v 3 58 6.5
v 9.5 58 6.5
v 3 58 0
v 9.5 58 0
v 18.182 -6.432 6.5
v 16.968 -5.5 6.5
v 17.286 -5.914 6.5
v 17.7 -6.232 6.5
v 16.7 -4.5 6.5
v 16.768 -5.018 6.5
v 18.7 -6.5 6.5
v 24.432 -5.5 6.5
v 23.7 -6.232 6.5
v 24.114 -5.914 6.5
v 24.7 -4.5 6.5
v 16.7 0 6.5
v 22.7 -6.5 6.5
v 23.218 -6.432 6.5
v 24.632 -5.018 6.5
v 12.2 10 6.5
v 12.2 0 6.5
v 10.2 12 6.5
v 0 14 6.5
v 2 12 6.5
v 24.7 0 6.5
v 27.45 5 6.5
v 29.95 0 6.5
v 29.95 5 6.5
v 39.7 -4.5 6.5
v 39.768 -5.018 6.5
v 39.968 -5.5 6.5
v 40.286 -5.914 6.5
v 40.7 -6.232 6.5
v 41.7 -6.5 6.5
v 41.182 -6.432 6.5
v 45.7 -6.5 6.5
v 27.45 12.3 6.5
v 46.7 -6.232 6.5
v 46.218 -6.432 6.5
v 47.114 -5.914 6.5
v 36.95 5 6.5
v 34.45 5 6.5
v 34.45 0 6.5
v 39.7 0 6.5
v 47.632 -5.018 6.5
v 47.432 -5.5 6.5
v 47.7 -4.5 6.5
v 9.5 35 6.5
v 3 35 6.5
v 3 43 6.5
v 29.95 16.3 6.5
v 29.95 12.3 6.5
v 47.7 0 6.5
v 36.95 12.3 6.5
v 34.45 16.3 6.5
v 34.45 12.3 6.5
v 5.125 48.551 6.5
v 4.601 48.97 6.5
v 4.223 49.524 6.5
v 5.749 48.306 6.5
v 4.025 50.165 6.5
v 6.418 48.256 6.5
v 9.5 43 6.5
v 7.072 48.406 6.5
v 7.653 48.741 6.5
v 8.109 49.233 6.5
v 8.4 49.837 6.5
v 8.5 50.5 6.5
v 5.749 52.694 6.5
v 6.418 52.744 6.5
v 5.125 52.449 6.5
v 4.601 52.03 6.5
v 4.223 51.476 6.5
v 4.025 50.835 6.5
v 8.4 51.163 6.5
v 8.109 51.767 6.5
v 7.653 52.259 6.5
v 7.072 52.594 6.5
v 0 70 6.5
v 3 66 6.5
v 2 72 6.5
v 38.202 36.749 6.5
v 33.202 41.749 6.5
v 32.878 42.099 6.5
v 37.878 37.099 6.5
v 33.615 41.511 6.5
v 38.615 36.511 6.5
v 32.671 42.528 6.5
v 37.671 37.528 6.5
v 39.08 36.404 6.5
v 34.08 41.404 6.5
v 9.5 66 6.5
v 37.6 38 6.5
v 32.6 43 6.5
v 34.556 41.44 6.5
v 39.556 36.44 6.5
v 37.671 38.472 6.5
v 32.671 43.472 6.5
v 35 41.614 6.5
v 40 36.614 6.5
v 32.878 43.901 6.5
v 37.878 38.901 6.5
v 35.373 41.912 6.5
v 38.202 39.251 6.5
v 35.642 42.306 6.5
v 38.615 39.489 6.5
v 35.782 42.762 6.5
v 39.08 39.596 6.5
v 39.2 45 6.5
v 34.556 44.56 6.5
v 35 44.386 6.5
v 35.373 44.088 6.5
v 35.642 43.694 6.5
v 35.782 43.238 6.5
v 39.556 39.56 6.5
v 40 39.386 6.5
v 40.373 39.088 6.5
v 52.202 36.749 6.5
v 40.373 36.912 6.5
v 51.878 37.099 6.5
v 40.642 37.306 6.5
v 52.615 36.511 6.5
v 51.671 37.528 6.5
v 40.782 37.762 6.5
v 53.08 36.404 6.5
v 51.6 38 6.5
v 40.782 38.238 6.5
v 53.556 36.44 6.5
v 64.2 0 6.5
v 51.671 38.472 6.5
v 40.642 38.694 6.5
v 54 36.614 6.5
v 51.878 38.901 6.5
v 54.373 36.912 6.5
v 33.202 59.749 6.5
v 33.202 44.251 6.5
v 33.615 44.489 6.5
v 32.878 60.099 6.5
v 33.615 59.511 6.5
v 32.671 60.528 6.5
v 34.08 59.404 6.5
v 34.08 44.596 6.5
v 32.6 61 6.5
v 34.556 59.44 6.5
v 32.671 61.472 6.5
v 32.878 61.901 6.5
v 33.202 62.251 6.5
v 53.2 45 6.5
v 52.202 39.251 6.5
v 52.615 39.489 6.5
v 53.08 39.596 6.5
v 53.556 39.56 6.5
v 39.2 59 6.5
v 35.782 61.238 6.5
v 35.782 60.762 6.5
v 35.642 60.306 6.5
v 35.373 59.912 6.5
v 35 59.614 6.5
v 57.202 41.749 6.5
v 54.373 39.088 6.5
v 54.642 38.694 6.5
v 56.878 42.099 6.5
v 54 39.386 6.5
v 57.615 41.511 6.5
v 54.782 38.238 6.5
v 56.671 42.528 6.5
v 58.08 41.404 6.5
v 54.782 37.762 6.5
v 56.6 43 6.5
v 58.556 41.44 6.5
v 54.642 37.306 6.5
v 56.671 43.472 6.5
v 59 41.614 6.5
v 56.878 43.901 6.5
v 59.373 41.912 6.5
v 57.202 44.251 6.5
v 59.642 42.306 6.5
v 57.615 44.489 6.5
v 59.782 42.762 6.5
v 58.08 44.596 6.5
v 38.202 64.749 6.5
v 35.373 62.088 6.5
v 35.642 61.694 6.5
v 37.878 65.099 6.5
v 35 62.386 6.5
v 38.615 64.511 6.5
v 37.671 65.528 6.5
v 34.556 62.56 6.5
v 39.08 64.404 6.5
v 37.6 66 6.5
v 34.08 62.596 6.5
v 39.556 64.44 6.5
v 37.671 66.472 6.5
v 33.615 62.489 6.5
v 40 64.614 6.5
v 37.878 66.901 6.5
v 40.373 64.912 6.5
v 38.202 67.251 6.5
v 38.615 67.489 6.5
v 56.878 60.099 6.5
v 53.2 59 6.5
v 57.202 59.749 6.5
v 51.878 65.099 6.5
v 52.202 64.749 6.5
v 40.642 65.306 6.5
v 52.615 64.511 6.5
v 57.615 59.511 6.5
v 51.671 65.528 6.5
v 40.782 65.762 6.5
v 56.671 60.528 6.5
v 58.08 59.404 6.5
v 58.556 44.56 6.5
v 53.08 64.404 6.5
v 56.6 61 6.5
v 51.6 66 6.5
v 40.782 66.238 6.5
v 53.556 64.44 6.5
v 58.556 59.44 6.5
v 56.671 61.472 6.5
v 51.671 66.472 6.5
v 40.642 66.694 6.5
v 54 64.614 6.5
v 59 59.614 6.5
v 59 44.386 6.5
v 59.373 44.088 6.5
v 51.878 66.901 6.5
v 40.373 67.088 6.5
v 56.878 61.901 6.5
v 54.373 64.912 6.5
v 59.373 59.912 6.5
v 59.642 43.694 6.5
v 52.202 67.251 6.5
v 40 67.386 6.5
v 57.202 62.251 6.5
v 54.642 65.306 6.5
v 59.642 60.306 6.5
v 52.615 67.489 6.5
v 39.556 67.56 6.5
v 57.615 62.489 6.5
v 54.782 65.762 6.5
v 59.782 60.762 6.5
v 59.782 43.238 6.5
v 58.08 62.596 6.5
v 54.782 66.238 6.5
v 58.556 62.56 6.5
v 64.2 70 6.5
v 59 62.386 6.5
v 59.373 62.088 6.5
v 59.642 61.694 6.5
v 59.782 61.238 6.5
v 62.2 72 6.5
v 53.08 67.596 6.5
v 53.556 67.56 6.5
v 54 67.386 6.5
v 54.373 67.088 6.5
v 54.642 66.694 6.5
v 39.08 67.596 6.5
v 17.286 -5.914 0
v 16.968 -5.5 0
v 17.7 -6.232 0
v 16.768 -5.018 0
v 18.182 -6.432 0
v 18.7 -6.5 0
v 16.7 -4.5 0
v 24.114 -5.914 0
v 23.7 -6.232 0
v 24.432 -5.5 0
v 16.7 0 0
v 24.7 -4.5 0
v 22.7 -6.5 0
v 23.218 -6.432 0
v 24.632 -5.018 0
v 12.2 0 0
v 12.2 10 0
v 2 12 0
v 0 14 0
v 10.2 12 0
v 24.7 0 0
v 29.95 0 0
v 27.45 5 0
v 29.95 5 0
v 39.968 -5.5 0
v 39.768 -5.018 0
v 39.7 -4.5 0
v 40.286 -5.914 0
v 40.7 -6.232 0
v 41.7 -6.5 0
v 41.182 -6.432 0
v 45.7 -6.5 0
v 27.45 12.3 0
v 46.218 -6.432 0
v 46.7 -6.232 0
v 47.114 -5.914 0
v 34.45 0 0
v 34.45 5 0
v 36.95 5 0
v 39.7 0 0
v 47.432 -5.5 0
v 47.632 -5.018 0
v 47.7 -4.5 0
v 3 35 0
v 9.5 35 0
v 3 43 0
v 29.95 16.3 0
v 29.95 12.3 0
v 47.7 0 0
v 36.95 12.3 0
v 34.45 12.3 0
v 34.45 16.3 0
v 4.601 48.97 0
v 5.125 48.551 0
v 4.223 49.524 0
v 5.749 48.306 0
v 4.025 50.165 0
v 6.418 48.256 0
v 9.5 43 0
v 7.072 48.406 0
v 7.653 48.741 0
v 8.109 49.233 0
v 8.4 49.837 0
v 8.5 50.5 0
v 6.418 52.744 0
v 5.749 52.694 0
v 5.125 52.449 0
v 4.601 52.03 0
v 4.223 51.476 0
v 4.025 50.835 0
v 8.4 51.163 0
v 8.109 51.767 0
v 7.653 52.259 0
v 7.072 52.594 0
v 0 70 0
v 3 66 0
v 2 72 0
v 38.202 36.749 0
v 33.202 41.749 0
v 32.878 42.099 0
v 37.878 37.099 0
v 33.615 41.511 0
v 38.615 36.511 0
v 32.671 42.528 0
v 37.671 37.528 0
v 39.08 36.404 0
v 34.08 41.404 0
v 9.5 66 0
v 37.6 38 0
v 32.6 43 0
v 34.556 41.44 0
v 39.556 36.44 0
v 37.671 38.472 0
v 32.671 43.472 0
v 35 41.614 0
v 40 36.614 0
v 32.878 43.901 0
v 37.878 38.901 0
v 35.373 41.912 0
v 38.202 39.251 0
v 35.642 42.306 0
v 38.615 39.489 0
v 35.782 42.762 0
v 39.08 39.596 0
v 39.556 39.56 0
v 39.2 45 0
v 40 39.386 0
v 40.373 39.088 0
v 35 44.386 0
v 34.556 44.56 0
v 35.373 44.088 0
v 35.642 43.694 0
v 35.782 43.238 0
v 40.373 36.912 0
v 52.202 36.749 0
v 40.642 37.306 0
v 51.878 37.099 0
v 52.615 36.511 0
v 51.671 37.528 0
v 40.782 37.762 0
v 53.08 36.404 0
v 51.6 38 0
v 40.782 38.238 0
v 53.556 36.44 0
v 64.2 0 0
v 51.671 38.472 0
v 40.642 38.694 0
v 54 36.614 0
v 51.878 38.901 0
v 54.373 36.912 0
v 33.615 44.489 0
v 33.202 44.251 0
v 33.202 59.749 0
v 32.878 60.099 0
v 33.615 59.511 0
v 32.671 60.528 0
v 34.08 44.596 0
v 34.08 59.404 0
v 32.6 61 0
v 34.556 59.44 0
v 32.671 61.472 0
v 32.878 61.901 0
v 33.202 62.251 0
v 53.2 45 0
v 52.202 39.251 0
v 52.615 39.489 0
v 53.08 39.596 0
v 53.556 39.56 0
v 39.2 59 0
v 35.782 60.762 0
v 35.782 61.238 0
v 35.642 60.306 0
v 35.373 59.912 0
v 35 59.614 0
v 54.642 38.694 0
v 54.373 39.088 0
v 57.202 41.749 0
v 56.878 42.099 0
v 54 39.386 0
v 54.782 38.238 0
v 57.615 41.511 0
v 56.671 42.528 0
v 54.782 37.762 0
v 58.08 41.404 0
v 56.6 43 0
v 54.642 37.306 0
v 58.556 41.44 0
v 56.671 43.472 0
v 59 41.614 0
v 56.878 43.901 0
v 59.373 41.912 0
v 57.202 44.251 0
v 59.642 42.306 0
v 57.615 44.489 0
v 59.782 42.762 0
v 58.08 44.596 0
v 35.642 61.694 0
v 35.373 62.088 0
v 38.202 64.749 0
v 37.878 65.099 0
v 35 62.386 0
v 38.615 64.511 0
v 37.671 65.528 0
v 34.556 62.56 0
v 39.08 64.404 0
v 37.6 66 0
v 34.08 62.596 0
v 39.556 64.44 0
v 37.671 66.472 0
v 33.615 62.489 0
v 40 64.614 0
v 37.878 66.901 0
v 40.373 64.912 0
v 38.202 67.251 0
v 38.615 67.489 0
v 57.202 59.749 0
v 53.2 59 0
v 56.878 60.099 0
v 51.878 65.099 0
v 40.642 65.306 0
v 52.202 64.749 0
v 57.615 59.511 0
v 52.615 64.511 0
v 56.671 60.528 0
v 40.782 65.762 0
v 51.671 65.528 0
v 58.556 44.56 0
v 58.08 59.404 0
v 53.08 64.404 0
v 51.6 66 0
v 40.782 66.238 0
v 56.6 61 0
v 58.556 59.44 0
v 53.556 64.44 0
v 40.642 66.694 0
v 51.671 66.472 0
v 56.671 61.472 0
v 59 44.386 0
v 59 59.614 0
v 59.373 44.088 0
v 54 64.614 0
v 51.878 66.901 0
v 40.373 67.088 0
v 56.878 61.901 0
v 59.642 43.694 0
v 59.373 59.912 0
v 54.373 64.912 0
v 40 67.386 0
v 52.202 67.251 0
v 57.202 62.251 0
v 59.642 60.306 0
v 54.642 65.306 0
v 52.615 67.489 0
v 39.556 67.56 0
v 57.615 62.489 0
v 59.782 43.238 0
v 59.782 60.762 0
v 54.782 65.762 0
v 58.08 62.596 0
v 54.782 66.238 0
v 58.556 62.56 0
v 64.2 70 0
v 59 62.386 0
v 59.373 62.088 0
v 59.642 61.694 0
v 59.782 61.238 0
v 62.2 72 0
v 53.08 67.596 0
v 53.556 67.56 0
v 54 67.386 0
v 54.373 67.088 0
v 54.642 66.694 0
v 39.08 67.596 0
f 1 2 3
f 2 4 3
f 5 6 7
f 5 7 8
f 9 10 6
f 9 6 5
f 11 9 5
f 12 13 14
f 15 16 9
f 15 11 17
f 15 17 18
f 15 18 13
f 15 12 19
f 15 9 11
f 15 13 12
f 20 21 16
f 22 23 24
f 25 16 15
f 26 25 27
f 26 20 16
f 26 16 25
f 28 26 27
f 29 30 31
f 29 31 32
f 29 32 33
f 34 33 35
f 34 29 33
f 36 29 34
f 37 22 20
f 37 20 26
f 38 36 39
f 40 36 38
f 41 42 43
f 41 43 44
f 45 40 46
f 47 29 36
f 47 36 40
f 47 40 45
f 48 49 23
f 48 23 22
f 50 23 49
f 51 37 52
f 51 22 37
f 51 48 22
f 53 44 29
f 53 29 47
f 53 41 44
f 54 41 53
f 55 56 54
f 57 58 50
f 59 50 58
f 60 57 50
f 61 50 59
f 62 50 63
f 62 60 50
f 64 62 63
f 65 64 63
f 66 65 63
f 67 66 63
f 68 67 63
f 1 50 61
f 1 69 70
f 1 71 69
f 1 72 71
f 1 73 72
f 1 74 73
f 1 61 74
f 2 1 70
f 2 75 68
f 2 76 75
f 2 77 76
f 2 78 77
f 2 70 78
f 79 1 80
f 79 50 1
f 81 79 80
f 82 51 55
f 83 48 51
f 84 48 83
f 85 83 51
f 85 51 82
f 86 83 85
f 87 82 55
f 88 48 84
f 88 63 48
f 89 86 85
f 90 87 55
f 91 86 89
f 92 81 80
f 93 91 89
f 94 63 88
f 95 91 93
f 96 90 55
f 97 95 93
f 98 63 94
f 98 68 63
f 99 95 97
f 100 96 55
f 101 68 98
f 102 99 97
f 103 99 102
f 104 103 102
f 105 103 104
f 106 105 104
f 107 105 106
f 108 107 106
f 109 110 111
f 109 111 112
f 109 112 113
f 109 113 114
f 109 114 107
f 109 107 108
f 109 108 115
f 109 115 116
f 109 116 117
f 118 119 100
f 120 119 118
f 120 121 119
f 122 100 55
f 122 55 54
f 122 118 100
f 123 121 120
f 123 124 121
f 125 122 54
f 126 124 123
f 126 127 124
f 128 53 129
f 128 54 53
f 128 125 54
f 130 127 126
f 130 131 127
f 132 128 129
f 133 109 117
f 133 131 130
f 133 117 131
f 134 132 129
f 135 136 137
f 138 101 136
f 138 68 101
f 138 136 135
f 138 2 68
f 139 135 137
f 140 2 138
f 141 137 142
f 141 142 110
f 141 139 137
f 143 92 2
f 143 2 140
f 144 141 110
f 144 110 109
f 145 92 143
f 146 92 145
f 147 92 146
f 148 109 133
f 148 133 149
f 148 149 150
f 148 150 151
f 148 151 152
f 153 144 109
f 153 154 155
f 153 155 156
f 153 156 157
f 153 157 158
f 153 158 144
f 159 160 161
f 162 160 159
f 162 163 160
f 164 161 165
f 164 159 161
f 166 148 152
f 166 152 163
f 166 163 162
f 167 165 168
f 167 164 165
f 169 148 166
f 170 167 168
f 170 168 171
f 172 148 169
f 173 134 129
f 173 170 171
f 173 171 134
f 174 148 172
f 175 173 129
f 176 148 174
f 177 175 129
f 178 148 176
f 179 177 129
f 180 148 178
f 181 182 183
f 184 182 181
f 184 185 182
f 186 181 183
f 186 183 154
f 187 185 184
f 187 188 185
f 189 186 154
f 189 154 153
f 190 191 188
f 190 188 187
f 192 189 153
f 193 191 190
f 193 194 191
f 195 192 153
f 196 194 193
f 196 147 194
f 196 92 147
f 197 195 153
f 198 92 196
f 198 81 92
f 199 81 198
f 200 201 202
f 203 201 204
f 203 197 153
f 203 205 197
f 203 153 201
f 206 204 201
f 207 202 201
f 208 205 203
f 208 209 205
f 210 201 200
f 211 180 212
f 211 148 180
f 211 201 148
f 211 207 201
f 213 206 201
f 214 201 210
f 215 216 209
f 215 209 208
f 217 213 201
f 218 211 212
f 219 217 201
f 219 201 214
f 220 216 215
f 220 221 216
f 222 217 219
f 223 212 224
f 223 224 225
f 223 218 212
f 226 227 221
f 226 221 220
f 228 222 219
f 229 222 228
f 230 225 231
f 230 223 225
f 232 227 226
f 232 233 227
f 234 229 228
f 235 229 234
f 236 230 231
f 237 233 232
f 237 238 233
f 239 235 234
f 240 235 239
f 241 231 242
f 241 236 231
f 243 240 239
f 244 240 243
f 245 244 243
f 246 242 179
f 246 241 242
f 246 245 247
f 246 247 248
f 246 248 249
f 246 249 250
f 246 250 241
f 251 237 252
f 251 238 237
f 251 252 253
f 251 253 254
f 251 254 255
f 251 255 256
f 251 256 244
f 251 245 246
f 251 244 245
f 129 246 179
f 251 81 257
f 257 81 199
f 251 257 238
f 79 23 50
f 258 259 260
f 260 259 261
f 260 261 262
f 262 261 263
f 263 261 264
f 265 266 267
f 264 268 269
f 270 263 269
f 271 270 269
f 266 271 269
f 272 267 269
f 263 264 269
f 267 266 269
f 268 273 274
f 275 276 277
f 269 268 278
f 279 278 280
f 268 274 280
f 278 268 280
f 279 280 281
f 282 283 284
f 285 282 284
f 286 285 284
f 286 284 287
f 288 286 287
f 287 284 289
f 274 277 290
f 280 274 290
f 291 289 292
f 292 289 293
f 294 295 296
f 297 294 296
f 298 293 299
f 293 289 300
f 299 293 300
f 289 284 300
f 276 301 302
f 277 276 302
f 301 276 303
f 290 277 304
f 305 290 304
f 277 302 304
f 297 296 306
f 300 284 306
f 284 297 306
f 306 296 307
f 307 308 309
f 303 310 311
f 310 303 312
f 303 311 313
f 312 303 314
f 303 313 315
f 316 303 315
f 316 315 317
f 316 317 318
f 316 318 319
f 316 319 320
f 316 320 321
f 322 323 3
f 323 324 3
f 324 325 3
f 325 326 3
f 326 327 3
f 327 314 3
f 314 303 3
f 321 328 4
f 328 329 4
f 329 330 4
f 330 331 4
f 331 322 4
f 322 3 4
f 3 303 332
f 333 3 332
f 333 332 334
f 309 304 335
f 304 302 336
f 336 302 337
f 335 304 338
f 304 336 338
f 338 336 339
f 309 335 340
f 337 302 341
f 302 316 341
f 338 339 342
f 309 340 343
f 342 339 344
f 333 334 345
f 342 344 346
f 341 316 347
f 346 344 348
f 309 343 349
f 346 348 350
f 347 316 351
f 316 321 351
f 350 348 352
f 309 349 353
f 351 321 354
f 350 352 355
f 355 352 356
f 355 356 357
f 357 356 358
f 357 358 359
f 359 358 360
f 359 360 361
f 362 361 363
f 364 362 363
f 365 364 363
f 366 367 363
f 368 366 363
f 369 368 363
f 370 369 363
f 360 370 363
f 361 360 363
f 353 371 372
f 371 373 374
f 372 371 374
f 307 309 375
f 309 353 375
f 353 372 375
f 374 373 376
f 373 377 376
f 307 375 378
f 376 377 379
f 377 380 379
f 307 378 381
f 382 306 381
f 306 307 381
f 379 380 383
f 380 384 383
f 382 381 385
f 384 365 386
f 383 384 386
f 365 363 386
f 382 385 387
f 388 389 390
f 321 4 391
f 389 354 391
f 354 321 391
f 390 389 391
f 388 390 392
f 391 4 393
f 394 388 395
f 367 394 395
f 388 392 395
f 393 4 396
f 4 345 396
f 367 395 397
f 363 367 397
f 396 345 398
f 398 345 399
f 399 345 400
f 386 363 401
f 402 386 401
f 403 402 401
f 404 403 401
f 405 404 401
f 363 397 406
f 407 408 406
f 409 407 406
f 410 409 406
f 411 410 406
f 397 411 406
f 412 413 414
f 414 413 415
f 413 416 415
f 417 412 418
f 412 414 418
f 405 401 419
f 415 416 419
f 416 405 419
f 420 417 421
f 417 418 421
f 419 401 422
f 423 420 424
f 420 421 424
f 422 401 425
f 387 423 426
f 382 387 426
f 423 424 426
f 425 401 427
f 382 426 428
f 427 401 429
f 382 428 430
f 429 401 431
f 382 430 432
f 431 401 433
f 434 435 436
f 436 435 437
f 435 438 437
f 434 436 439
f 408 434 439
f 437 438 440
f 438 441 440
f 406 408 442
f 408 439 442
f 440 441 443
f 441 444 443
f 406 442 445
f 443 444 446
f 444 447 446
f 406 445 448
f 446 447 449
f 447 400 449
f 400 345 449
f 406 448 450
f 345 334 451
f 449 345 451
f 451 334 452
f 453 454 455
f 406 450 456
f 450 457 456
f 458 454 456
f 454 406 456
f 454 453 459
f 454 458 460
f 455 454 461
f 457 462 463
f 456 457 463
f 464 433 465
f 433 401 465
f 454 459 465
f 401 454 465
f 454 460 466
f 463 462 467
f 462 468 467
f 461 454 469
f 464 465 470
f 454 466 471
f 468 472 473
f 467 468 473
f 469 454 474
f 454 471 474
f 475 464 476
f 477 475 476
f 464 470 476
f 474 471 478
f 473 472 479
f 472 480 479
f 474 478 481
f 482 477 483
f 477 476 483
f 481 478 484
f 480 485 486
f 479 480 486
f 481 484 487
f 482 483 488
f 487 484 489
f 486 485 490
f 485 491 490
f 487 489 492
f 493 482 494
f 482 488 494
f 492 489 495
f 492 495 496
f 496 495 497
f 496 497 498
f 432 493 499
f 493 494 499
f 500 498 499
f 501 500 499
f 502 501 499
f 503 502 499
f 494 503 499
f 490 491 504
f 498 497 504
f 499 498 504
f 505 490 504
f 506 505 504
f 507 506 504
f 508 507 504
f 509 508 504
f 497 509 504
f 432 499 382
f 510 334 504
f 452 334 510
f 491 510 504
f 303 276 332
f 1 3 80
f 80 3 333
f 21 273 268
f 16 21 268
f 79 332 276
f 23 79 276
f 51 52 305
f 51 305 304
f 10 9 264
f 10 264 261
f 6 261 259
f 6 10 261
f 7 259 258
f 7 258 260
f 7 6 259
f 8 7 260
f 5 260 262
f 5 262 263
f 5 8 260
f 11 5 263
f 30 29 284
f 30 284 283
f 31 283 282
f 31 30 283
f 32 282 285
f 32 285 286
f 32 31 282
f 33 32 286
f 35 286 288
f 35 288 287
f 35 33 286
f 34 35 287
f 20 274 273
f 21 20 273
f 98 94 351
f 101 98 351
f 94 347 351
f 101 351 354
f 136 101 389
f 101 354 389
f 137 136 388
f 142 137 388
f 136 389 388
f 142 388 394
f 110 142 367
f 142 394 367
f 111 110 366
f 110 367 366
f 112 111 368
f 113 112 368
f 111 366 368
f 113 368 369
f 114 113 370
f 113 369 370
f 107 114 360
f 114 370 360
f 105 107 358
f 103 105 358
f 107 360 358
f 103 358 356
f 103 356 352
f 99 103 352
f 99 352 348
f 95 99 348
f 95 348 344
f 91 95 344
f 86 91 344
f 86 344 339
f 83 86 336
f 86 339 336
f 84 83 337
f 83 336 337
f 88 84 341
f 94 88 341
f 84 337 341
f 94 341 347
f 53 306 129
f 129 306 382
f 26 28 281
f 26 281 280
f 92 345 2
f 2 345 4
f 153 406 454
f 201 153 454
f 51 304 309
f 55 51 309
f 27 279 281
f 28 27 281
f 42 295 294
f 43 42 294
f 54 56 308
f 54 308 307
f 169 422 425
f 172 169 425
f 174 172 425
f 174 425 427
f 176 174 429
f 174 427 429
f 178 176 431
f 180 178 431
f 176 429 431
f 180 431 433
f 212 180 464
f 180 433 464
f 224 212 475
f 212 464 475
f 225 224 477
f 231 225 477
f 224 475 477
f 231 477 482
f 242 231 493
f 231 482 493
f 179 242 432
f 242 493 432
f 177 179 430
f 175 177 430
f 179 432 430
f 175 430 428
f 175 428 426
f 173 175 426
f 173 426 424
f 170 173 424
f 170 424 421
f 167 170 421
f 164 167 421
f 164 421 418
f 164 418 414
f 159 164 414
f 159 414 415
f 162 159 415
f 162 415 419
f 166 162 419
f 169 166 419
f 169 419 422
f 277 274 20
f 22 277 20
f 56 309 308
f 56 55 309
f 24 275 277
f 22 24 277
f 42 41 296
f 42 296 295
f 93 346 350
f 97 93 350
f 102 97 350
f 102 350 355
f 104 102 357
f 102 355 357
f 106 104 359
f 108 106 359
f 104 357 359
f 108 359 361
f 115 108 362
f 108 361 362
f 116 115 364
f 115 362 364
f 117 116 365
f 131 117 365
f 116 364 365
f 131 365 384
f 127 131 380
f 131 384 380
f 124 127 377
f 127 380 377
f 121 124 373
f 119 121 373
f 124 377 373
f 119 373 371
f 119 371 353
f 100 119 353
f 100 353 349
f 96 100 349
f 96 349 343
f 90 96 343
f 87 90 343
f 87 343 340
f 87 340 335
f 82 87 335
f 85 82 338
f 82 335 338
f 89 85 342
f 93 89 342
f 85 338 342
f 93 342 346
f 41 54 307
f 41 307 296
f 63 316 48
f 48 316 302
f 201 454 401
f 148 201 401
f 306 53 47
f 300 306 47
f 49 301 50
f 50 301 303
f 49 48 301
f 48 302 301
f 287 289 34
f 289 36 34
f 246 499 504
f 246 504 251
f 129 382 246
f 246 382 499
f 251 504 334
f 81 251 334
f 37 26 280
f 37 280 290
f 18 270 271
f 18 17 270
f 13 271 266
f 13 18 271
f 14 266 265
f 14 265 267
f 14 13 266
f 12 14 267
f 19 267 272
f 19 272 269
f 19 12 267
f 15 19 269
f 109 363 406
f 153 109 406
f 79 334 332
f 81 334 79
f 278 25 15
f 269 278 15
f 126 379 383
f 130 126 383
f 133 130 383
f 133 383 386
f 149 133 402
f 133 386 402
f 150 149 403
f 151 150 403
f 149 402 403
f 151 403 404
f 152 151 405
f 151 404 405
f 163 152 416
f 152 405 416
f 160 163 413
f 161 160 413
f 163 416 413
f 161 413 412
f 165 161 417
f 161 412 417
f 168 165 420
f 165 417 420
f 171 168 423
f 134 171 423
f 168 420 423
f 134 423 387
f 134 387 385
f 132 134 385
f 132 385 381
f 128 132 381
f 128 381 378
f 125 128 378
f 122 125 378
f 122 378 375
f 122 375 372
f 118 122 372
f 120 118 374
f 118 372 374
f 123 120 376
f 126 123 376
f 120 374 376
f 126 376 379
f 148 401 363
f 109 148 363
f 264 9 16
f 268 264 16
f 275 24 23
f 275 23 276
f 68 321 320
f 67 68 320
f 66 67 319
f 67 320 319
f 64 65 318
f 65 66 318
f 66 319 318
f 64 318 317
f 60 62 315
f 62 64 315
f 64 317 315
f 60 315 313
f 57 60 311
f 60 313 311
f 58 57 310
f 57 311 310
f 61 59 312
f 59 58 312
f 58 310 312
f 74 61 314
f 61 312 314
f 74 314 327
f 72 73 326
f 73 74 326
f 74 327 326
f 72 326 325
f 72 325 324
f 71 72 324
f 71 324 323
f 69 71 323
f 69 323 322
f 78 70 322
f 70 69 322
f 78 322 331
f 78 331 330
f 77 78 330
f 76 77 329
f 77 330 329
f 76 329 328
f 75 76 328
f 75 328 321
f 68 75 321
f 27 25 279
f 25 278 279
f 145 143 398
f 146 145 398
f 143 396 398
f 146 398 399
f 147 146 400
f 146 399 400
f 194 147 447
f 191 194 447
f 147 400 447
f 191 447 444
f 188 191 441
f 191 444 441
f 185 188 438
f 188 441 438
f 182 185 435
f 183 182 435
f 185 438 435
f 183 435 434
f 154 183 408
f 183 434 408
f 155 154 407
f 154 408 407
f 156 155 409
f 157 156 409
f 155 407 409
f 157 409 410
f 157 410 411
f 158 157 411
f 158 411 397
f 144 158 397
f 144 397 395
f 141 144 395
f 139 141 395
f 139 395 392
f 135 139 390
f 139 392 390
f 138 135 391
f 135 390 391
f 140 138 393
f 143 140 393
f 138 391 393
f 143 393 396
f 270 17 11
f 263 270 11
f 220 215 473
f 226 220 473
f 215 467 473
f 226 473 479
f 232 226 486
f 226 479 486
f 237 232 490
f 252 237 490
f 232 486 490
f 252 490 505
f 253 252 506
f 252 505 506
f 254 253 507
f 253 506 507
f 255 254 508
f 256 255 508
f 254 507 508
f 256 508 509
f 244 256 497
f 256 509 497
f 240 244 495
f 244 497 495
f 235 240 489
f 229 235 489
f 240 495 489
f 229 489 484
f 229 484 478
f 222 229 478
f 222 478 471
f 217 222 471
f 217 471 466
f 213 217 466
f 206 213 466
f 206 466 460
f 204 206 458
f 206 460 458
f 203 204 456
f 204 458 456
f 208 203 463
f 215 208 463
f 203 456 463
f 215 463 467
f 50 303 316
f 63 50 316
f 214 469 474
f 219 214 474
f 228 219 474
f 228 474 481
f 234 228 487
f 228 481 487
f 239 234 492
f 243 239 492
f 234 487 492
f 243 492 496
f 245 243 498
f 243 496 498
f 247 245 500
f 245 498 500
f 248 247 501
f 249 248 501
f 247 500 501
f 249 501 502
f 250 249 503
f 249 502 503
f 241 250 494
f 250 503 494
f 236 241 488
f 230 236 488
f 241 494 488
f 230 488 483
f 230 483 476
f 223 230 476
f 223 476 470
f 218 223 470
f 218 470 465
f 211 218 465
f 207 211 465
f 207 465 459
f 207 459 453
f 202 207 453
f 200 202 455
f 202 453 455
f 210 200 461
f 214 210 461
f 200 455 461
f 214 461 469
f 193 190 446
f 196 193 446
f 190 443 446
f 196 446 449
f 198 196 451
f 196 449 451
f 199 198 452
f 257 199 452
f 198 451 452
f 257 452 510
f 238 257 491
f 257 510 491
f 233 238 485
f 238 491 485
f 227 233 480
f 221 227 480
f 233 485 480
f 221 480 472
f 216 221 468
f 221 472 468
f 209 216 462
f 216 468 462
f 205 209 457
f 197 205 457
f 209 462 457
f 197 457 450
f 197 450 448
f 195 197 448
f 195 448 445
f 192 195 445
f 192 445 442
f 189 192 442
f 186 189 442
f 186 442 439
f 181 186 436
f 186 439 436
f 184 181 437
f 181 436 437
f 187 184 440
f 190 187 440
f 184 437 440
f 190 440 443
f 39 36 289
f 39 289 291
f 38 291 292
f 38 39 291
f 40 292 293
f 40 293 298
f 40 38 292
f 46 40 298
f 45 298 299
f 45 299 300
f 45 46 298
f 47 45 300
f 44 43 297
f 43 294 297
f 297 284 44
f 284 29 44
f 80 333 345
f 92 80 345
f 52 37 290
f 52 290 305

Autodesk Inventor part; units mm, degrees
ref_plane "YZ Plane" through (0, 0, 0) normal (1, 0, 0) x (0, 1, 0)
ref_plane "XZ Plane" through (0, 0, 0) normal (0, 1, 0) x (-1, 0, 0)
ref_plane "XY Plane" through (0, 0, 0) normal (0, 0, 1) x (1, 0, 0)
sketch "Sketch1" plane through (0, 0, 0) normal (0, 0, 1) x (1, 0, 0)
  line L0 (12.2, 0) -> (64.2, 0)
  line L1 (64.2, 0) -> (64.2, 72)
  line L2 (64.2, 72) -> (0, 72)
  line L3 (0, 72) -> (0, 12)
  line L4 (3, 66) -> (9.5, 66)
  line L5 (9.5, 66) -> (9.5, 58)
  line L6 (9.5, 58) -> (3, 58)
  line L7 (3, 58) -> (3, 66)
  line L8 (3, 43) -> (9.5, 43)
  line L9 (9.5, 43) -> (9.5, 35)
  line L10 (9.5, 35) -> (3, 35)
  line L11 (3, 35) -> (3, 43)
  line L12 (0, 12) -> (12.2, 12)
  line L13 (12.2, 12) -> (12.2, 0)
  line L14 (3, 58) -> (9.5, 43) construction
  line L15 (3, 43) -> (9.5, 58) construction
  circle A0 centre (6.25, 50.5) radius 2.25
  point P0 (0, 0)
  dimension "d1" = 6.5
  dimension "d2" = 8
  dimension "d3" = 8
  dimension "d4" = 15
  dimension "d5" = 3
  dimension "d6" = 72
  dimension "d7" = 4.5
  dimension "d8" = 64.2
  dimension "d9" = 12
  dimension "d10" = 52
  dimension "d11" = 6
extrude "Extrusion1" add sketch "Sketch1" along normal blind 6.5
sketch "Sketch2" plane through (0, 0, 6.5) normal (0, 0, 1) x (1, 0, 0)
  line L0 (64.2, 0) -> (64.2, 72) projected
  line L1 (12.2, 0) -> (64.2, 0) projected
  line L2 (29.95, 16.3) -> (34.45, 16.3)
  line L3 (34.45, 0) -> (29.95, 0)
  line L4 (36.95, 12.3) -> (36.95, 5)
  line L5 (27.45, 5) -> (27.45, 12.3)
  line L6 (29.95, 0) -> (29.95, 5)
  line L7 (29.95, 12.3) -> (29.95, 16.3)
  line L8 (27.45, 12.3) -> (29.95, 12.3)
  line L9 (34.45, 12.3) -> (36.95, 12.3)
  line L10 (34.45, 16.3) -> (34.45, 12.3)
  line L11 (34.45, 5) -> (34.45, 0)
  line L12 (36.95, 5) -> (34.45, 5)
  line L13 (29.95, 5) -> (27.45, 5)
  point P0 (0, 0)
  point P1 (32.2, 16.3)
  dimension "d14" = 2.5
  dimension "d15" = 2.5
  dimension "d16" = 4.5
  dimension "d17" = 5
  dimension "d18" = 7.3
  dimension "d19" = 4
  dimension "d20" = 32
extrude "Extrusion2" cut sketch "Sketch2" against normal blind 6.5
sketch "Sketch3" plane through (0, 0, 6.5) normal (0, 0, 1) x (1, 0, 0)
  line L0 (34.45, 0) -> (64.2, 0) projected
  line L1 (12.2, 0) -> (29.95, 0) projected
  line L2 (29.95, 16.3) -> (34.45, 16.3) projected
  line L3 (16.7, 0) -> (24.7, 0)
  line L4 (24.7, 0) -> (24.7, -4.5)
  line L5 (22.7, -6.5) -> (18.7, -6.5)
  line L6 (16.7, -4.5) -> (16.7, 0)
  line L7 (39.7, 0) -> (47.7, 0)
  line L8 (47.7, 0) -> (47.7, -4.5)
  line L9 (45.7, -6.5) -> (41.7, -6.5)
  line L10 (39.7, -4.5) -> (39.7, 0)
  arc A0 (16.7, -4.5) -> (18.7, -6.5) centre (18.7, -4.5) ccw
  arc A1 (22.7, -6.5) -> (24.7, -4.5) centre (22.7, -4.5) ccw
  arc A2 (39.7, -4.5) -> (41.7, -6.5) centre (41.7, -4.5) ccw
  arc A3 (45.7, -6.5) -> (47.7, -4.5) centre (45.7, -4.5) ccw
  point P0 (0, 0)
  point P1 (32.2, 16.3)
  dimension "d23" = 2
  dimension "d24" = 8
  dimension "d25" = 8
  dimension "d26" = 6.5
  dimension "d27" = 15
  dimension "d28" = 7.5
extrude "Extrusion3" add sketch "Sketch3" against normal blind 6.5
chamfer "Chamfer1" distance 2 angle 45 2 edges at (0, 72, 3.25) (64.2, 72, 3.25)
sketch "Sketch4" plane through (0, 0, 0) normal (0, 0, -1) x (-1, 0, 0)
  line L0 (-64.2, 70) -> (-64.2, 0) projected
  line L1 (-2, 72) -> (-62.2, 72) projected
  line L2 (-39.2, 59) -> (-53.2, 59)
  line L3 (-53.2, 59) -> (-53.2, 45)
  line L4 (-53.2, 45) -> (-39.2, 45)
  line L5 (-39.2, 45) -> (-39.2, 59)
  line L6 (-34.2, 66) -> (-58.2, 66) construction
  line L7 (-58.2, 66) -> (-58.2, 38) construction
  line L8 (-58.2, 38) -> (-34.2, 38) construction
  line L9 (-34.2, 38) -> (-34.2, 66) construction
  circle A0 centre (-58.2, 61) radius 1.6
  circle A1 centre (-58.2, 43) radius 1.6
  circle A2 centre (-53.2, 38) radius 1.6
  circle A3 centre (-39.2, 38) radius 1.6
  circle A4 centre (-34.2, 43) radius 1.6
  circle A5 centre (-34.2, 61) radius 1.6
  circle A6 centre (-39.2, 66) radius 1.6
  circle A7 centre (-53.2, 66) radius 1.6
  point P0 (0, 0)
  point P1 (-58.2, 52)
  point P2 (-53.2, 52)
  point P3 (-46.2, 38)
  point P4 (-46.2, 45)
  dimension "d34" = 3.2
  dimension "d35" = 5
  dimension "d36" = 5
  dimension "d37" = 5
  dimension "d38" = 5
  dimension "d39" = 5
  dimension "d40" = 5
  dimension "d41" = 5
  dimension "d42" = 5
  dimension "d43" = 14
  dimension "d44" = 14
  dimension "d45" = 5
  dimension "d46" = 7
  dimension "d47" = 6
  dimension "d48" = 6
extrude "Extrusion4" cut sketch "Sketch4" against normal through all
chamfer "Chamfer2" distance 2 angle 45 2 edges at (0, 12, 3.25) (12.2, 12, 3.25)
equation "\"d36\" = d35"
equation "\"d37\" = d35"
equation "\"d38\" = d35"
equation "\"d39\" = d35"
equation "\"d40\" = d35"
equation "\"d41\" = d35"
equation "\"d42\" = d35"
properties part number "x_motor_cable_mount"
